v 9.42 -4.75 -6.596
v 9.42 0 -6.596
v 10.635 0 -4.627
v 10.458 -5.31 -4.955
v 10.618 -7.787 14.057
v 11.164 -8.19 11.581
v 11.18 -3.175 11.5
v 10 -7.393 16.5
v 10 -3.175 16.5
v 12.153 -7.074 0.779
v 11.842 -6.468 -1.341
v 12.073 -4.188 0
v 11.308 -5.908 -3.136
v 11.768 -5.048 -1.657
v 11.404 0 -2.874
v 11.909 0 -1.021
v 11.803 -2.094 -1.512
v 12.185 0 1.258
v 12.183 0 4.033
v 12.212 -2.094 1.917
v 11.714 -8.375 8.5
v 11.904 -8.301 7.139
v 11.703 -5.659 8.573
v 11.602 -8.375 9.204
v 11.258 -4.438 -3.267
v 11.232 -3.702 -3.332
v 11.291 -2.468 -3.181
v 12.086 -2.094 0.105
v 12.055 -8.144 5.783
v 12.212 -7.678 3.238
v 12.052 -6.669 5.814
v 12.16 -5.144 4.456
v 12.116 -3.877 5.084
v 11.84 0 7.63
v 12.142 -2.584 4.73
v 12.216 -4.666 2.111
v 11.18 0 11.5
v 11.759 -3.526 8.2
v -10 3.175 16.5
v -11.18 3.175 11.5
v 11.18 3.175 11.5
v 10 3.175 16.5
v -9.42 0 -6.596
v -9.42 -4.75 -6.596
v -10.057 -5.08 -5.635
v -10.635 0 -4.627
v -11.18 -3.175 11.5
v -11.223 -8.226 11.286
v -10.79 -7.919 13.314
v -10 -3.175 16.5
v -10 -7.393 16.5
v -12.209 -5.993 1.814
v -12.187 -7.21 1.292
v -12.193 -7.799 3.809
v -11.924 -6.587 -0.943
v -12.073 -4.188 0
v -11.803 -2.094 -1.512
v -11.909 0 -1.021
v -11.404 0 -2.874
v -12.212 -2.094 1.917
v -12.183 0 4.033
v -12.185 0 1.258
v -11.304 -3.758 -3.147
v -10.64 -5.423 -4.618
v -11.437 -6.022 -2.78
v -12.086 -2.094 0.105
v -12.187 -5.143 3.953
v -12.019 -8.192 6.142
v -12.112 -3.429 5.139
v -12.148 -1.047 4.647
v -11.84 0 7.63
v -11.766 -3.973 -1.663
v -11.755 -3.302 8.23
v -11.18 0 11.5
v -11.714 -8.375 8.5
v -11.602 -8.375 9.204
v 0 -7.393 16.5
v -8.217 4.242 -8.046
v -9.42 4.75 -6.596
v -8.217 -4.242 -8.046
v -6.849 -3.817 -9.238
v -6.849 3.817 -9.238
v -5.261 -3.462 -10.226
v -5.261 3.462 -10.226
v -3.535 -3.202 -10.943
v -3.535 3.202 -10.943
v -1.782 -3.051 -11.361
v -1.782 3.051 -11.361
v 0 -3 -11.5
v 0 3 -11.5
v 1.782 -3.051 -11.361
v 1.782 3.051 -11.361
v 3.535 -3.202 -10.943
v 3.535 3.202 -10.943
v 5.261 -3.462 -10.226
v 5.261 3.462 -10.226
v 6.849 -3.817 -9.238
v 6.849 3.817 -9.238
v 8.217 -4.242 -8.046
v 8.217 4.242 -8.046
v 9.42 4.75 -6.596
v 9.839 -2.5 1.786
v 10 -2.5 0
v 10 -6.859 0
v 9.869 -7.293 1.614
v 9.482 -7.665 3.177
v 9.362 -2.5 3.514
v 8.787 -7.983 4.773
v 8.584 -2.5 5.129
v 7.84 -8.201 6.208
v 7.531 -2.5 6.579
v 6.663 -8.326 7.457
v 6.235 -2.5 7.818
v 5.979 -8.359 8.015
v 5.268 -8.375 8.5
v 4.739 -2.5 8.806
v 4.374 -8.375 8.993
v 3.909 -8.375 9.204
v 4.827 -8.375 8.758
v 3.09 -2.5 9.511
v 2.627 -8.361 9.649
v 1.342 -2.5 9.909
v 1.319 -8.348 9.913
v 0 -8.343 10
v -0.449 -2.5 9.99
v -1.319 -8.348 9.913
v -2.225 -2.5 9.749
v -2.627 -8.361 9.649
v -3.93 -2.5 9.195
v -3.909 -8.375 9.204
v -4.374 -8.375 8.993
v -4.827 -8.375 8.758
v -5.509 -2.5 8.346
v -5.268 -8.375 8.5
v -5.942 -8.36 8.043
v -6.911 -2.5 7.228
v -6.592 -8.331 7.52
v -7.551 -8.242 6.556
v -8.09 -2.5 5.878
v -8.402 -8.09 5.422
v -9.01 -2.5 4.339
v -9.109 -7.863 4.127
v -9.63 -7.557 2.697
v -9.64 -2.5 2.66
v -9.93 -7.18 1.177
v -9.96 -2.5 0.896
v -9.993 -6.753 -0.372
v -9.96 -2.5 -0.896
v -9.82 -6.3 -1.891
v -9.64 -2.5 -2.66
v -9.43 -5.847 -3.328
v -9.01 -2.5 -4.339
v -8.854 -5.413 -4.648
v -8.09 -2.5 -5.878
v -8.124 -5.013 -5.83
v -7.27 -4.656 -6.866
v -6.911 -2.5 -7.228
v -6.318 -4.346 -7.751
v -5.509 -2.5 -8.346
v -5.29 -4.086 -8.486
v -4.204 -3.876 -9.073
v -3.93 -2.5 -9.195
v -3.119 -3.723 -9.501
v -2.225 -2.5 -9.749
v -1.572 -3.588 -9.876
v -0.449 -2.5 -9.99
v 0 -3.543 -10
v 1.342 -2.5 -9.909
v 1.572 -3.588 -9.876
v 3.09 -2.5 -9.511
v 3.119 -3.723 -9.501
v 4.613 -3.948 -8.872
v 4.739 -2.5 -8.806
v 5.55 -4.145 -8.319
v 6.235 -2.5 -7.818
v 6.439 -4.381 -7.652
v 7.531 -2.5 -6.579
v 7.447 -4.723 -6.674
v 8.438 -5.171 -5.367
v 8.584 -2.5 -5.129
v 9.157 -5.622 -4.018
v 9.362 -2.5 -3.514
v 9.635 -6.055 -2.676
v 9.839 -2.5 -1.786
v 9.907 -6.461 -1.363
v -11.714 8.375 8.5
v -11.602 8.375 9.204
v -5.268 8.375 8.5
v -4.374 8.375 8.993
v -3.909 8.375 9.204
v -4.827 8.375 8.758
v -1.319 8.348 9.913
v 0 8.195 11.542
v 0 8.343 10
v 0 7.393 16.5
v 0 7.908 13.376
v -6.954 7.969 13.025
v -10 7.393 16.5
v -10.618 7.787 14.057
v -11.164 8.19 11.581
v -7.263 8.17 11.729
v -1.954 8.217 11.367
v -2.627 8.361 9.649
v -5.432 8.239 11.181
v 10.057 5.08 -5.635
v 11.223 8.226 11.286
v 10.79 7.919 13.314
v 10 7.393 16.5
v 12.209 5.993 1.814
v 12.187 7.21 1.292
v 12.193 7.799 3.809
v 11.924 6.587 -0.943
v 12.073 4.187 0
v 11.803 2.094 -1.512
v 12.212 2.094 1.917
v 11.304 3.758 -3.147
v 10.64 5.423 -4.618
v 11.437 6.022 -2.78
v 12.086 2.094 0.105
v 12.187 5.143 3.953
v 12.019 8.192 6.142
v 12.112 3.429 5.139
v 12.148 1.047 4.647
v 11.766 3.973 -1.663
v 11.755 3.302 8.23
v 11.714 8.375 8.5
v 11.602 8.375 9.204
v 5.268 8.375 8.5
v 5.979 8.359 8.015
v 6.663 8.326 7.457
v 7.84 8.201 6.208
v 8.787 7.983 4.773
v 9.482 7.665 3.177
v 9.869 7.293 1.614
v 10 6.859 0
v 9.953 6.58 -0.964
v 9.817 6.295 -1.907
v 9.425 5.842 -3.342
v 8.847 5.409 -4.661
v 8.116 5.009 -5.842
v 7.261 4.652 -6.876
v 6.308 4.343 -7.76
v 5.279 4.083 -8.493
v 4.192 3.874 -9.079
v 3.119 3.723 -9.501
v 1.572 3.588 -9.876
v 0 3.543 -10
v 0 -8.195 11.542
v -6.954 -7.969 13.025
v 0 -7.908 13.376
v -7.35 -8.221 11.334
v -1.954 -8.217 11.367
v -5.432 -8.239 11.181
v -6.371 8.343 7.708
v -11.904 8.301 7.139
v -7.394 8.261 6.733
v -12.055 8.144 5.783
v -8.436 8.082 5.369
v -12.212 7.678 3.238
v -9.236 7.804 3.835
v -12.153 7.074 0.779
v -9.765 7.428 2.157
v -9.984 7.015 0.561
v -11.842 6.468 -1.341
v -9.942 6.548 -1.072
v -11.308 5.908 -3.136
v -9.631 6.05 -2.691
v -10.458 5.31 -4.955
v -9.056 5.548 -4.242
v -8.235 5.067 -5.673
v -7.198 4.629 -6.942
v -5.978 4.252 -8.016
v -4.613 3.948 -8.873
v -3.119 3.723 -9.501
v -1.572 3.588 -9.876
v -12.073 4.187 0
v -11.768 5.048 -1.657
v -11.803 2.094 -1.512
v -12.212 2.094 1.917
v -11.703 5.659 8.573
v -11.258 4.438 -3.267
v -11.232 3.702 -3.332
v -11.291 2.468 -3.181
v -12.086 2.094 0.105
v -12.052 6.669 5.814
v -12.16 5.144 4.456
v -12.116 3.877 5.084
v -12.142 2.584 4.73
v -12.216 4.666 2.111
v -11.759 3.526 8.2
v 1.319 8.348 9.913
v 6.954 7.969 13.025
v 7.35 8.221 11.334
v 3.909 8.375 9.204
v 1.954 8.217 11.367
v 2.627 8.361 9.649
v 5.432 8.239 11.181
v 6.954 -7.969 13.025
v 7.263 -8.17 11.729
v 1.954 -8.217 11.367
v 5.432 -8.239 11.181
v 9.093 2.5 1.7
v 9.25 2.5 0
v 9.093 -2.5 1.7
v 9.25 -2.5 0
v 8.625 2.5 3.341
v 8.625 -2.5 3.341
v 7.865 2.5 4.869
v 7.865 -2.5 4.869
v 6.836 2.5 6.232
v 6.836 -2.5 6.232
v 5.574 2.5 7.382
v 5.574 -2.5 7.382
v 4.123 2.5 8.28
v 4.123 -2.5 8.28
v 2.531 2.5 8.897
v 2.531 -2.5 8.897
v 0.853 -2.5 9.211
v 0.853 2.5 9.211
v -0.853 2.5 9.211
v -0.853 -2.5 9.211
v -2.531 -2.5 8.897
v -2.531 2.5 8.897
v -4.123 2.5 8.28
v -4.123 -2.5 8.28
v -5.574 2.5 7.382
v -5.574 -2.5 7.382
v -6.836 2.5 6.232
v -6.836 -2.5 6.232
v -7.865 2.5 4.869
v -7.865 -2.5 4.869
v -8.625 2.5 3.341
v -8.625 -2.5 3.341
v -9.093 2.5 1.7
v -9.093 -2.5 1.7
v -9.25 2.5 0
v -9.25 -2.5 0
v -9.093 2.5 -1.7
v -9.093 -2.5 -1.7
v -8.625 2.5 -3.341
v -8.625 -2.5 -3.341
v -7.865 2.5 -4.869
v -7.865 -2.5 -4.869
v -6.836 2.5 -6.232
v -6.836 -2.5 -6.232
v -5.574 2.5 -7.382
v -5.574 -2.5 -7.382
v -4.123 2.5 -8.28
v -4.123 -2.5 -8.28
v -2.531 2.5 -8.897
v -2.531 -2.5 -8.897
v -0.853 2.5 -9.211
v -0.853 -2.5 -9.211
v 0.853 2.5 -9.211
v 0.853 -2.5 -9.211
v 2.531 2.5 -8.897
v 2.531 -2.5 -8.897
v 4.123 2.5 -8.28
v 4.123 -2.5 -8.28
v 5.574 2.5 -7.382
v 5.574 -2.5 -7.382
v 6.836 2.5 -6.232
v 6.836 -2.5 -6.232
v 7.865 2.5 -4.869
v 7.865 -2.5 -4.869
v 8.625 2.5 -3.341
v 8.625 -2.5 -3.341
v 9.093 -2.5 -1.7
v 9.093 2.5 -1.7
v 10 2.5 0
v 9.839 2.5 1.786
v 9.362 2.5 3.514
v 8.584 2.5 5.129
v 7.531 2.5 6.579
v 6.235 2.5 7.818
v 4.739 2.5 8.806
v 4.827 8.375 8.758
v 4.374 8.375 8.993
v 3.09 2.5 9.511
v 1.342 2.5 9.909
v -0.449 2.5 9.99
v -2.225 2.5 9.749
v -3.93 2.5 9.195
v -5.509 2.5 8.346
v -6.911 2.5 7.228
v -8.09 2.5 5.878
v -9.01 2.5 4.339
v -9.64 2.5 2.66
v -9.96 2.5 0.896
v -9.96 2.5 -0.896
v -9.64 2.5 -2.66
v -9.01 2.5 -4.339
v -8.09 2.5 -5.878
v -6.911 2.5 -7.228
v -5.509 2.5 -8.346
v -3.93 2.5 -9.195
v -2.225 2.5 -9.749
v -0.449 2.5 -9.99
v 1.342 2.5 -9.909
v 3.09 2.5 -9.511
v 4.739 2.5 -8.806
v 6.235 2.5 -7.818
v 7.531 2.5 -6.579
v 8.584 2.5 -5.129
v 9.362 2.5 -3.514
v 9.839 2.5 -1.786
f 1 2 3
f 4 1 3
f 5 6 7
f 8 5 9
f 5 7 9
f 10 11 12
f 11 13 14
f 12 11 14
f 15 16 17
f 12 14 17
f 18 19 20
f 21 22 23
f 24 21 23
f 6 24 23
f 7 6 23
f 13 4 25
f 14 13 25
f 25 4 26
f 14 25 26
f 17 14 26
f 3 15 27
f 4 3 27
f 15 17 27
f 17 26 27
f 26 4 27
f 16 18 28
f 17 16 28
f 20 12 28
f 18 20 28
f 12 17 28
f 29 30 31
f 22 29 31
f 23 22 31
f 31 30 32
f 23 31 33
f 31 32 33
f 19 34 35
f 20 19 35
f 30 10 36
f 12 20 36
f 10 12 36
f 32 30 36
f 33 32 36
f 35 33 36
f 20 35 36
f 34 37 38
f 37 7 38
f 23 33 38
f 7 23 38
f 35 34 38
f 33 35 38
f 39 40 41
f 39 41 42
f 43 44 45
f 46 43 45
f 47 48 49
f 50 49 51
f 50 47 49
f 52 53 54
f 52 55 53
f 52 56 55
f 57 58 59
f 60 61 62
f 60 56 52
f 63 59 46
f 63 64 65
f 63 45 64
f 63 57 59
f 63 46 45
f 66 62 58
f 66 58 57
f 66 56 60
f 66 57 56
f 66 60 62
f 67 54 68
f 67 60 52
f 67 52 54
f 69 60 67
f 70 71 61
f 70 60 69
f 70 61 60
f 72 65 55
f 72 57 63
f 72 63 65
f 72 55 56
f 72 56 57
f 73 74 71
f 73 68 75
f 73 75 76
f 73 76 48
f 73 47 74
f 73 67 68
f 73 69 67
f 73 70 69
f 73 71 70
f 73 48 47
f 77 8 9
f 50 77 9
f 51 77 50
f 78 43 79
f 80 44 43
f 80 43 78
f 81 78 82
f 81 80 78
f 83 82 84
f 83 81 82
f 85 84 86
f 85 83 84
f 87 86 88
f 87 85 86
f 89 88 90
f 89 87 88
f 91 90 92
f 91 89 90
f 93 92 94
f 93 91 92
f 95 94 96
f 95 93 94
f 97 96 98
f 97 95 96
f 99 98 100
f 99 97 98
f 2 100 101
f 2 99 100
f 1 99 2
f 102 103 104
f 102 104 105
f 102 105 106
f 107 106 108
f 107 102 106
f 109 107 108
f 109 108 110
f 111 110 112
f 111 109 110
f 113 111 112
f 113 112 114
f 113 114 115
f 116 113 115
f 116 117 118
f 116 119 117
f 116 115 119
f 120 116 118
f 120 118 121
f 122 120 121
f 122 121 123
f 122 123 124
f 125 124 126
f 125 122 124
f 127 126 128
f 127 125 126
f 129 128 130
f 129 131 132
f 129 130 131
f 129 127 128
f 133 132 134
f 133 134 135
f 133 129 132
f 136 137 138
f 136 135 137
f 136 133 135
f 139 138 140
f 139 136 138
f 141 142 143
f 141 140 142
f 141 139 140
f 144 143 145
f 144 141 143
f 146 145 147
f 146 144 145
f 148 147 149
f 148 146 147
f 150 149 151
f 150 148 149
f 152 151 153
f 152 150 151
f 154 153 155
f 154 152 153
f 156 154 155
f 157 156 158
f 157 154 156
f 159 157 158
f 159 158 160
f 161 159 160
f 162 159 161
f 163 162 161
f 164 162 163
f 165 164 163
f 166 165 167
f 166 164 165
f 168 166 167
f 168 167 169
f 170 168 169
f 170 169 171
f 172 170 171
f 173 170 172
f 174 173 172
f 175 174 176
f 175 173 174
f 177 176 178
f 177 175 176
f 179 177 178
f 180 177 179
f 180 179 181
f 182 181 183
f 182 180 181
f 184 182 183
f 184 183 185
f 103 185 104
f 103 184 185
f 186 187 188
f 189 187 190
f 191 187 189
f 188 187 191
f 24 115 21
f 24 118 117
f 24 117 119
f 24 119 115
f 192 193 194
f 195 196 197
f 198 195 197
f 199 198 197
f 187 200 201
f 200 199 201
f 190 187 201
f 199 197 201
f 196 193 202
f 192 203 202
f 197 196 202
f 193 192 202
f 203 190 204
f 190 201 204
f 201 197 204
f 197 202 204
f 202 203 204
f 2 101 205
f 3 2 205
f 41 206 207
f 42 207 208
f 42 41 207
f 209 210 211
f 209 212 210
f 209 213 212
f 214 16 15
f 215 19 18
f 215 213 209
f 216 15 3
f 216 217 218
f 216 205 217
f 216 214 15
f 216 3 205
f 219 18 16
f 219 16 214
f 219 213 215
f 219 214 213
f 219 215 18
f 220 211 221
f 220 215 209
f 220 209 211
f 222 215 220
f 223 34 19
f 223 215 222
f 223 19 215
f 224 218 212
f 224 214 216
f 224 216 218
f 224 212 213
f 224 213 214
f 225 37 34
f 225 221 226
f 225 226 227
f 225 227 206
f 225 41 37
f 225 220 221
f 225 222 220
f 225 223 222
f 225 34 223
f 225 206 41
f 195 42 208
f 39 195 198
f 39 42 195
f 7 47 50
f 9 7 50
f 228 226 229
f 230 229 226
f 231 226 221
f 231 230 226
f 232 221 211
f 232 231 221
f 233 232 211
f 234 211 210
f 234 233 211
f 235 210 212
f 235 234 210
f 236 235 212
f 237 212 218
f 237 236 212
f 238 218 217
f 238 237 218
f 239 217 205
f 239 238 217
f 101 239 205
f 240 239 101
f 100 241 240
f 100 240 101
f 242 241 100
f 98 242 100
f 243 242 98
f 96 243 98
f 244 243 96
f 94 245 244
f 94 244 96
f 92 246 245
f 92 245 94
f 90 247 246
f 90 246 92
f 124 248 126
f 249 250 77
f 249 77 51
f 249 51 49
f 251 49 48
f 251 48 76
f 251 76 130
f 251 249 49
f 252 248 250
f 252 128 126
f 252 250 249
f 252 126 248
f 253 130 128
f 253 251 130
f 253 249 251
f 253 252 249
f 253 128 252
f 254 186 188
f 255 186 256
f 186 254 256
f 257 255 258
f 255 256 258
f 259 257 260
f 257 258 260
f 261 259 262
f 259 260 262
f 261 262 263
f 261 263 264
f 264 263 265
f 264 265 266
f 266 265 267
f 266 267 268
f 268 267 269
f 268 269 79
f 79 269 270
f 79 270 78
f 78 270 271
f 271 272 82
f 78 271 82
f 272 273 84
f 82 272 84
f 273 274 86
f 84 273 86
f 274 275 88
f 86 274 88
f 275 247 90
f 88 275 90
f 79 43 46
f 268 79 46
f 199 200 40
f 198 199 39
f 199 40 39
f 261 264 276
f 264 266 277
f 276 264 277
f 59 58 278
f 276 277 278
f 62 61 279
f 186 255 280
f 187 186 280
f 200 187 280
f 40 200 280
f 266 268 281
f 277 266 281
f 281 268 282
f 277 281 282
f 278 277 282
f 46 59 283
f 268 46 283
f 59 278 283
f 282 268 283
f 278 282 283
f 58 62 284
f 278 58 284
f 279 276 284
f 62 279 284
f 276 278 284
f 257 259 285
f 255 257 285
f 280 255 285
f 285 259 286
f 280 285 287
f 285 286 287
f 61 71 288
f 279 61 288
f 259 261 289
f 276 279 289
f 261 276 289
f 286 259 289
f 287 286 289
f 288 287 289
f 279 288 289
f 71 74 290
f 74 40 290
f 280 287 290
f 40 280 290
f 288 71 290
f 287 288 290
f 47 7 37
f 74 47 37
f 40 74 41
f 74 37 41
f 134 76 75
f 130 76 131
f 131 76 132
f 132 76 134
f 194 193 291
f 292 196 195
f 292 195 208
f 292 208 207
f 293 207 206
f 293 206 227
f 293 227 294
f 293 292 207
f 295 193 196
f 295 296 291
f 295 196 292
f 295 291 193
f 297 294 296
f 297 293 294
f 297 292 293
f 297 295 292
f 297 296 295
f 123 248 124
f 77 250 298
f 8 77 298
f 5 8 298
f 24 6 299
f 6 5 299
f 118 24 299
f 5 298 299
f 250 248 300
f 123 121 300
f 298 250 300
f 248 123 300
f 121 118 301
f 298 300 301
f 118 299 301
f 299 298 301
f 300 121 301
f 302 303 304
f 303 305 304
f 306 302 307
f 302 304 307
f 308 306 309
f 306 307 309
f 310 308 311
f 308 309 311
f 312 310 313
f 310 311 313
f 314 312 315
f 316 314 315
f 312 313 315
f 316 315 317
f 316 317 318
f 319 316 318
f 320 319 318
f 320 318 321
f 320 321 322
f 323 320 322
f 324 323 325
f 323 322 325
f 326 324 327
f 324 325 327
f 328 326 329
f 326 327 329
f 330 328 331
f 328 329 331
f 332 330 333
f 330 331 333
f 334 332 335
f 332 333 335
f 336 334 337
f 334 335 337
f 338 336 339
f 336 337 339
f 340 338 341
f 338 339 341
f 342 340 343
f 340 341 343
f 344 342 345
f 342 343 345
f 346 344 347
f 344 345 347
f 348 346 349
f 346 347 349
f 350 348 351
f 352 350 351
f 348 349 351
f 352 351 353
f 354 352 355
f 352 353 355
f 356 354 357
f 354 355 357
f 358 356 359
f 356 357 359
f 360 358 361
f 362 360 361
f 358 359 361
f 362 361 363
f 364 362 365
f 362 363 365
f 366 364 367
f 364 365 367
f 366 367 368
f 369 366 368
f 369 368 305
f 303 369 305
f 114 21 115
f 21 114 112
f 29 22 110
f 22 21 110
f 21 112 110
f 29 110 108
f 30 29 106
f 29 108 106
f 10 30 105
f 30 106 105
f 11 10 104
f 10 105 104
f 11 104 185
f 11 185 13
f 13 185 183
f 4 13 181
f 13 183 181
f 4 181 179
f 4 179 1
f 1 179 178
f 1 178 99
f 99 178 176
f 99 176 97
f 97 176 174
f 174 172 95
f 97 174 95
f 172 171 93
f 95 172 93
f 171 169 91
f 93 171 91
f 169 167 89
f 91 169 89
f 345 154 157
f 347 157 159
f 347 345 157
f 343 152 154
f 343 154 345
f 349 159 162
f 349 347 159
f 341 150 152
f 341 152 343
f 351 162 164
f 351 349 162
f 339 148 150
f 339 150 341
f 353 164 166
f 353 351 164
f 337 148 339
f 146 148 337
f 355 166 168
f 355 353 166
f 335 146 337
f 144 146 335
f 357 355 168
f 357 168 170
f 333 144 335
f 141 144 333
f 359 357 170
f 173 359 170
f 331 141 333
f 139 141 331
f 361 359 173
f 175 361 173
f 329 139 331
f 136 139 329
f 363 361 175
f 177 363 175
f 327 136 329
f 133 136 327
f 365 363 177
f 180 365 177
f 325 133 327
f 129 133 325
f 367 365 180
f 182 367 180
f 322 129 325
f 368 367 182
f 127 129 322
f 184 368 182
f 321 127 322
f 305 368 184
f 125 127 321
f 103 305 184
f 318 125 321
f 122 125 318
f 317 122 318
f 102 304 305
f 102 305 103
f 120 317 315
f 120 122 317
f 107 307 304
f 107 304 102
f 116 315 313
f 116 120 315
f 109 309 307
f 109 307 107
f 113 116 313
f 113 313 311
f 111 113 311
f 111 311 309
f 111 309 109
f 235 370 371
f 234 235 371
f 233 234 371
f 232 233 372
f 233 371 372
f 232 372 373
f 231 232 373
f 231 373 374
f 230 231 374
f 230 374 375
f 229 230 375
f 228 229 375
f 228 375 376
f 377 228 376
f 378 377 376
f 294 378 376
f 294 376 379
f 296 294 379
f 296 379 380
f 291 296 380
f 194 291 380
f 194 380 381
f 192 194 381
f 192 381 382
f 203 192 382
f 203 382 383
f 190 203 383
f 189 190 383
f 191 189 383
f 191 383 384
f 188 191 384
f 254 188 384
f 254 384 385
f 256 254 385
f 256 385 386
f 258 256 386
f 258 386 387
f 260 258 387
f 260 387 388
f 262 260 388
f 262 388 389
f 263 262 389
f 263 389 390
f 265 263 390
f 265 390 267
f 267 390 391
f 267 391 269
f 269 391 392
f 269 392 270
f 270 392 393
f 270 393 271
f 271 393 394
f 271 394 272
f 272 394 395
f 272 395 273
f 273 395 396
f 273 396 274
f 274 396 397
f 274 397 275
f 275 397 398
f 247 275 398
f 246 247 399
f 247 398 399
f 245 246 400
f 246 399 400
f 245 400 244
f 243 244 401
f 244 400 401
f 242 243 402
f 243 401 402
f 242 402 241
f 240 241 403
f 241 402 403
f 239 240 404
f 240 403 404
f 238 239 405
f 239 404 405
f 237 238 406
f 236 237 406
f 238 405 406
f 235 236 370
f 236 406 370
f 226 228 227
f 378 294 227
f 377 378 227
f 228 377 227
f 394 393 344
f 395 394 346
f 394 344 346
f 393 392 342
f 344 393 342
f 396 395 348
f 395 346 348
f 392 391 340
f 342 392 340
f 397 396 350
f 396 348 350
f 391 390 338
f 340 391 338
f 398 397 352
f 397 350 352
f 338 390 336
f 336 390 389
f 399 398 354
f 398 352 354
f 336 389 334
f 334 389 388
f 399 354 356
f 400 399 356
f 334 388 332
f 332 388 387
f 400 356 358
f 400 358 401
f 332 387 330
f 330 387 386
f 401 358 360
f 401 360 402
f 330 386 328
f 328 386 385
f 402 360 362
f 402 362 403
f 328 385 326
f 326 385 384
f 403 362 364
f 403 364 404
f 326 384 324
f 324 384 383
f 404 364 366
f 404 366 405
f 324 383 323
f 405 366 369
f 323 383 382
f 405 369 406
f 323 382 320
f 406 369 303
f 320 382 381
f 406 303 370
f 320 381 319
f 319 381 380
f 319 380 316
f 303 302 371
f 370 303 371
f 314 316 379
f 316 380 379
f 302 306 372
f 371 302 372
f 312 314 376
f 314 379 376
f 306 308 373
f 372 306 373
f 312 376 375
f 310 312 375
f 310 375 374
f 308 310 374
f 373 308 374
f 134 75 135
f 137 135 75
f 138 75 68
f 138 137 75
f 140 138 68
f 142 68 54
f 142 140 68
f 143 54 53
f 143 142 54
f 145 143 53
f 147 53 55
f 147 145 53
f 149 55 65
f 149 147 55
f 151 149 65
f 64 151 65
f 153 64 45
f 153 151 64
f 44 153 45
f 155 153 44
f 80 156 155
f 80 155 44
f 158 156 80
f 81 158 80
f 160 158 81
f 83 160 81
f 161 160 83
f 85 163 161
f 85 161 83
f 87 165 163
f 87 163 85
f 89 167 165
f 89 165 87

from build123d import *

# Parameters (mm, degrees)
F1_R      = 8.5
F2_DEPTH  = 8.375
F4_DEPTH  = 25
F5_R      = 9.25
F6_DEPTH  = 25
F8_R      = 10
F9_DEPTH  = 25
F11_R     = 10
F12_DEPTH = 25
F14_W     = 6.35
F14_H     = 15
F15_DEPTH = 25


with BuildPart() as f2:
    # F1 (on Front) → F2 (new body, symmetric)
    with BuildSketch(Plane.XZ):
        with BuildLine():
            Line((10, 16.5), (-10, 16.5))
            add(Edge.make_bspline(
                [(-9.4202485093, -6.596129018), (-10.7339585576, -4.7199566312), (-13.237953942, 0.2165761702), (-11.6404121135, 10.3778986471), (-10, 16.5)],
                knots=[0, 0, 0, 0, 0.3953497888, 1, 1, 1, 1], degree=3))
            ThreePointArc((-9.4202485093, -6.596129018), (0, -11.5), (9.4202485093, -6.596129018))
            add(Edge.make_bspline(
                [(9.4202485093, -6.596129018), (10.7339585576, -4.7199566312), (13.237953942, 0.2165761702), (11.6404121135, 10.3778986471), (10, 16.5)],
                knots=[0, 0, 0, 0, 0.3953497888, 1, 1, 1, 1], degree=3))
        make_face()
        Circle(F1_R, mode=Mode.SUBTRACT)
    extrude(amount=F2_DEPTH, both=True)

    # F3 (on Right) → F4 (intersect, symmetric)
    with BuildSketch(Plane.YZ):
        with BuildLine():
            Line((0, 23.2340655672), (-7.3927235128, 16.5))
            add(Edge.make_bspline(
                [(-7.3927235128, 16.5), (-7.6966545202, 14.0246805856), (-9.6172618847, 7.6235921039), (-6.1354099401, -2.8855319888), (-3, -11.5)],
                knots=[0, 0, 0, 0, 0.3841811099, 1, 1, 1, 1], degree=3))
            Line((-3, -11.5), (0, -19.7424322584))
            Line((0, -19.7424322584), (3, -11.5))
            add(Edge.make_bspline(
                [(7.3927235128, 16.5), (7.6966545202, 14.0246805856), (9.6172618847, 7.6235921039), (6.1354099401, -2.8855319888), (3, -11.5)],
                knots=[0, 0, 0, 0, 0.3841811099, 1, 1, 1, 1], degree=3))
            Line((7.3927235128, 16.5), (0, 23.2340655672))
        make_face()
    extrude(amount=F4_DEPTH, both=True, mode=Mode.INTERSECT)

    # F5 (on Front) → F6 (cut, symmetric)
    with BuildSketch(Plane.XZ):
        Circle(F5_R)
    extrude(amount=F6_DEPTH, both=True, mode=Mode.SUBTRACT)

    # F8 (on offset) → F9 (cut)
    with BuildSketch(Plane.XZ.offset(2.5)):
        Circle(F8_R)
    extrude(amount=F9_DEPTH, mode=Mode.SUBTRACT)

    # F11 (on offset) → F12 (cut)
    with BuildSketch(Plane.XZ.offset(-2.5)):
        Circle(F11_R)
    extrude(amount=-F12_DEPTH, mode=Mode.SUBTRACT)

    # F14 (on Right) → F15 (cut, symmetric)
    with BuildSketch(Plane.YZ):
        with Locations((0, 19)):
            Rectangle(F14_W, F14_H)
    extrude(amount=F15_DEPTH, both=True, mode=Mode.SUBTRACT)


solid = f2.part
